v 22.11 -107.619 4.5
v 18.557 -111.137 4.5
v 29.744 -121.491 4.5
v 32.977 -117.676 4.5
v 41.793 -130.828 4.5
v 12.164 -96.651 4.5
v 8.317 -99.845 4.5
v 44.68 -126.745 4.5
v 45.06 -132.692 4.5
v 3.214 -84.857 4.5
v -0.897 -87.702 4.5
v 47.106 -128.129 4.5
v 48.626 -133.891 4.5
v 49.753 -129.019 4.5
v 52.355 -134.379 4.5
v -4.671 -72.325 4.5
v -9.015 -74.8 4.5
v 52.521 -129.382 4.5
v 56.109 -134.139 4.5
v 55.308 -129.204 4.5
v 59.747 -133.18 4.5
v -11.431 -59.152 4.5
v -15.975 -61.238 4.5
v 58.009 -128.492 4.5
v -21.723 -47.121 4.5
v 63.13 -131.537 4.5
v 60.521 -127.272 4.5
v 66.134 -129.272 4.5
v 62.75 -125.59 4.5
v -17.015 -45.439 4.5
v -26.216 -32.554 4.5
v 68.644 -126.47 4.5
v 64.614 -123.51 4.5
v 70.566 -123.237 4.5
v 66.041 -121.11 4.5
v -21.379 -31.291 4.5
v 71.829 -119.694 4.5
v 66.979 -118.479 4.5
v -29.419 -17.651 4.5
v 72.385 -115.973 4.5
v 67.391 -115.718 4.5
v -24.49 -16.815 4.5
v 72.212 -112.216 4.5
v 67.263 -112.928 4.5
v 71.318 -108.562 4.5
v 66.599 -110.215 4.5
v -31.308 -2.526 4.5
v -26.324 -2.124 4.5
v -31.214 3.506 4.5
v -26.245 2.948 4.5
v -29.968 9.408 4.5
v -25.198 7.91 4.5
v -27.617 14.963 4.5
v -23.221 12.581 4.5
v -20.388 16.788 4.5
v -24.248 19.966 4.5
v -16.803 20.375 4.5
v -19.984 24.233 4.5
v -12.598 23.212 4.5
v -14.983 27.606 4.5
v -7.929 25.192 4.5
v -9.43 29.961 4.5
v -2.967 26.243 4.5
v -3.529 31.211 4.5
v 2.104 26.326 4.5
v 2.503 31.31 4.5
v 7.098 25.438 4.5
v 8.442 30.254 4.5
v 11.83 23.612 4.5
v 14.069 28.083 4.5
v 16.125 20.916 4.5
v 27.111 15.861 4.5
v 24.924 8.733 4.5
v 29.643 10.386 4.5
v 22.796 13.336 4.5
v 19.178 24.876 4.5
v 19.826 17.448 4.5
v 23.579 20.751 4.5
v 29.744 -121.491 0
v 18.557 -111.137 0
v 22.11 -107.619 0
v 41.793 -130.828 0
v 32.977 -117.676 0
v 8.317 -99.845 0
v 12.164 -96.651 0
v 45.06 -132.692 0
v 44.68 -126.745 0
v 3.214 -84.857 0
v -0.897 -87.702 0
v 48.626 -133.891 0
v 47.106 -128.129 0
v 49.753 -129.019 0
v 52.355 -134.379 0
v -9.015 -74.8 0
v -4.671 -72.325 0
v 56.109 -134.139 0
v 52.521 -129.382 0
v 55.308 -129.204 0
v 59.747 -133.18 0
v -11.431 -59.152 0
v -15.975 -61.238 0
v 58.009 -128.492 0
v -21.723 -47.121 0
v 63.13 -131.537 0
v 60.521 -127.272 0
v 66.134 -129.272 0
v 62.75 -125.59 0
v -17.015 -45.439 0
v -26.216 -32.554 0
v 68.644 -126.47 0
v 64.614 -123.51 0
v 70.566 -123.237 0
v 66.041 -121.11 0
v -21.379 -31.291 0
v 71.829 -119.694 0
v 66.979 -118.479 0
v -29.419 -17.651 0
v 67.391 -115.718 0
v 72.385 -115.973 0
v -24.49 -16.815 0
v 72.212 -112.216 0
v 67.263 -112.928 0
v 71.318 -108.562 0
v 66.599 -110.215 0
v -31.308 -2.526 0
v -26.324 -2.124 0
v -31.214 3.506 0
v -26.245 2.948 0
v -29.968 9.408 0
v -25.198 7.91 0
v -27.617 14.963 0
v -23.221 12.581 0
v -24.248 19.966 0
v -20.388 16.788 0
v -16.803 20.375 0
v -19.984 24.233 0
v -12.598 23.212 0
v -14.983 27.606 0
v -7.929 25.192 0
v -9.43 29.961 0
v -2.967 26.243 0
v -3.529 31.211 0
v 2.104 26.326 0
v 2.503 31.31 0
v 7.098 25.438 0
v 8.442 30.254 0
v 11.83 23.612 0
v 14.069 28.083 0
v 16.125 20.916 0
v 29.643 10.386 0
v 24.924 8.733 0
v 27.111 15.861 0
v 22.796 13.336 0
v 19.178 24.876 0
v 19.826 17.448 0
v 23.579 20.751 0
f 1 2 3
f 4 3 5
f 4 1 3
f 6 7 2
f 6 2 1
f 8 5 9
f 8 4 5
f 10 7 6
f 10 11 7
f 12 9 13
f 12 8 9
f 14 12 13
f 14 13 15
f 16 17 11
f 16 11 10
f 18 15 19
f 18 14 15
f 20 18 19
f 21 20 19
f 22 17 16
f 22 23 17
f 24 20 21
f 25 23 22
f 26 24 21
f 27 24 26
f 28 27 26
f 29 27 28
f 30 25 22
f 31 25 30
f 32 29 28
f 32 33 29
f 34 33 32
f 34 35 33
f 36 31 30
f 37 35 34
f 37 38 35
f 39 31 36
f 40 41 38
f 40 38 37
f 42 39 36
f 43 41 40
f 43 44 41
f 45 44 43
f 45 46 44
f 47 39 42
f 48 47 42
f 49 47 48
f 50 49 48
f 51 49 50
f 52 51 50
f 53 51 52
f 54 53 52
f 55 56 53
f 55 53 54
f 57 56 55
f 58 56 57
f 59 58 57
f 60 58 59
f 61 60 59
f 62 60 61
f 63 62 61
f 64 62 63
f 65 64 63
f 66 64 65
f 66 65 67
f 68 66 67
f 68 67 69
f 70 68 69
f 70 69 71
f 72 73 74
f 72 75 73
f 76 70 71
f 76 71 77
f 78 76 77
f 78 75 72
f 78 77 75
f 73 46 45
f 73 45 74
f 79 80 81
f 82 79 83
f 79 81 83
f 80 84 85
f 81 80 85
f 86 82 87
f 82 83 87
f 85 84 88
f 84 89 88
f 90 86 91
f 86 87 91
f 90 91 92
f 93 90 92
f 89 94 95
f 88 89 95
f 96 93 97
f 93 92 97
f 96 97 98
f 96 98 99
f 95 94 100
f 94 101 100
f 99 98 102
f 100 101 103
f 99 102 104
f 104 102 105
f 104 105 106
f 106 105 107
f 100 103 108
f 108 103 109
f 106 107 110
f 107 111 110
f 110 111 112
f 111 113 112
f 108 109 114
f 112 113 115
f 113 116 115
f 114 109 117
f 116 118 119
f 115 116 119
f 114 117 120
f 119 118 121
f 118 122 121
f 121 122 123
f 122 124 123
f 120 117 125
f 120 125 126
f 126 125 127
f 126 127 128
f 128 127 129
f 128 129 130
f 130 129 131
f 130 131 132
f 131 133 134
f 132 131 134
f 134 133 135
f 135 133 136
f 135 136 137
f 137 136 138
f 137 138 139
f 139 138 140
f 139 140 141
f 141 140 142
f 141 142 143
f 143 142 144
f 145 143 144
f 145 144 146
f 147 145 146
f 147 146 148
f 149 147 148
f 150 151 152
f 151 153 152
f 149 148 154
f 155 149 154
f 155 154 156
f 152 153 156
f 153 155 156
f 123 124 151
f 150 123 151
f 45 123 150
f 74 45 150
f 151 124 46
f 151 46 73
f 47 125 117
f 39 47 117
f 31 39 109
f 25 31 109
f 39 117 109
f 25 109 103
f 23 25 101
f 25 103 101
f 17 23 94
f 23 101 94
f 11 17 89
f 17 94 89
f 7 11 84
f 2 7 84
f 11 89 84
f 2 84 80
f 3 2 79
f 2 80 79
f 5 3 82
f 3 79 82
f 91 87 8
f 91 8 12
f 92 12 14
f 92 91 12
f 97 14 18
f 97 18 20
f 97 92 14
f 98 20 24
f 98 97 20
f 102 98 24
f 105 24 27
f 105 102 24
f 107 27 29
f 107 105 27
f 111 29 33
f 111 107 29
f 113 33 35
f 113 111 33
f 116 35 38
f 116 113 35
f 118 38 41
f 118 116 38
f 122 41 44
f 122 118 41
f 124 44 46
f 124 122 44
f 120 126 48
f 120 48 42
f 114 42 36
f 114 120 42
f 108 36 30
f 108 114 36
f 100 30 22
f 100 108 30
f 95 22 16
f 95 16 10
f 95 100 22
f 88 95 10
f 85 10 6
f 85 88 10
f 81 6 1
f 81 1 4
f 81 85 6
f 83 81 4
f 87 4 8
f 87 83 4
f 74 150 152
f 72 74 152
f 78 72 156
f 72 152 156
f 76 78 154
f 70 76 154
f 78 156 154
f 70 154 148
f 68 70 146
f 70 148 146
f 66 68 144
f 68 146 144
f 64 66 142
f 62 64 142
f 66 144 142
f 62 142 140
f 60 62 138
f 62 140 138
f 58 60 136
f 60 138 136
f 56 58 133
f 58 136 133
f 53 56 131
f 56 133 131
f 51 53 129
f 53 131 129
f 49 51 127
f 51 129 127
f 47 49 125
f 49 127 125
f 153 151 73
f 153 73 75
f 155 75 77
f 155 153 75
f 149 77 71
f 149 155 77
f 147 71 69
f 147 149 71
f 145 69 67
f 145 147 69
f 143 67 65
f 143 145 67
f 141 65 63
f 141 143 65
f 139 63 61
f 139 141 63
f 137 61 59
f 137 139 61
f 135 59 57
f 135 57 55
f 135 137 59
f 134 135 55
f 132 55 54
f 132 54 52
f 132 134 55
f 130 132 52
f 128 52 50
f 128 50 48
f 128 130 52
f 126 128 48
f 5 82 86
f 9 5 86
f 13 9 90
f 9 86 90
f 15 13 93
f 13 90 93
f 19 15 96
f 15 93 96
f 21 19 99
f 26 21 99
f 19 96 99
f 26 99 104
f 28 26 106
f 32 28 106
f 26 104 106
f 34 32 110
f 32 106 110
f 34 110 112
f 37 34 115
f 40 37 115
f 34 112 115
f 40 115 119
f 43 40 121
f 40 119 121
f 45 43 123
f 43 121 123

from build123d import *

# Parameters (mm, degrees)
BOSS_EXTRUDE1_DEPTH = 4.5


with BuildPart() as part:
    # Sketch1 → Boss-Extrude1 (new body)
    with BuildSketch(Plane.XY):
        with BuildLine():
            Line((71.318213966, -108.561967819), (29.643230329, 10.3859037))
            ThreePointArc((29.643230329, 10.3859037), (-6.509198083, 30.728137599), (-31.308299059, -2.525571229))
            ThreePointArc((-31.308299059, -2.525571229), (-9.015287266, -74.800110093), (41.79304757, -130.827785878))
            ThreePointArc((41.79304757, -130.827785878), (64.686923189, -130.477223183), (71.318213966, -108.561967819))
        make_face()
        with BuildLine():
            Line((66.599457149, -110.215247618), (24.924473511, 8.732623901))
            ThreePointArc((24.924473511, 8.732623901), (-5.473031562, 25.836679847), (-26.324488321, -2.123538241))
            ThreePointArc((-26.324488321, -2.123538241), (-4.670950627, -72.32488502), (44.679949278, -126.7454093))
            ThreePointArc((44.679949278, -126.7454093), (61.676381409, -126.485151265), (66.599457149, -110.215247618))
        make_face(mode=Mode.SUBTRACT)
    extrude(amount=BOSS_EXTRUDE1_DEPTH)


solid = part.part
